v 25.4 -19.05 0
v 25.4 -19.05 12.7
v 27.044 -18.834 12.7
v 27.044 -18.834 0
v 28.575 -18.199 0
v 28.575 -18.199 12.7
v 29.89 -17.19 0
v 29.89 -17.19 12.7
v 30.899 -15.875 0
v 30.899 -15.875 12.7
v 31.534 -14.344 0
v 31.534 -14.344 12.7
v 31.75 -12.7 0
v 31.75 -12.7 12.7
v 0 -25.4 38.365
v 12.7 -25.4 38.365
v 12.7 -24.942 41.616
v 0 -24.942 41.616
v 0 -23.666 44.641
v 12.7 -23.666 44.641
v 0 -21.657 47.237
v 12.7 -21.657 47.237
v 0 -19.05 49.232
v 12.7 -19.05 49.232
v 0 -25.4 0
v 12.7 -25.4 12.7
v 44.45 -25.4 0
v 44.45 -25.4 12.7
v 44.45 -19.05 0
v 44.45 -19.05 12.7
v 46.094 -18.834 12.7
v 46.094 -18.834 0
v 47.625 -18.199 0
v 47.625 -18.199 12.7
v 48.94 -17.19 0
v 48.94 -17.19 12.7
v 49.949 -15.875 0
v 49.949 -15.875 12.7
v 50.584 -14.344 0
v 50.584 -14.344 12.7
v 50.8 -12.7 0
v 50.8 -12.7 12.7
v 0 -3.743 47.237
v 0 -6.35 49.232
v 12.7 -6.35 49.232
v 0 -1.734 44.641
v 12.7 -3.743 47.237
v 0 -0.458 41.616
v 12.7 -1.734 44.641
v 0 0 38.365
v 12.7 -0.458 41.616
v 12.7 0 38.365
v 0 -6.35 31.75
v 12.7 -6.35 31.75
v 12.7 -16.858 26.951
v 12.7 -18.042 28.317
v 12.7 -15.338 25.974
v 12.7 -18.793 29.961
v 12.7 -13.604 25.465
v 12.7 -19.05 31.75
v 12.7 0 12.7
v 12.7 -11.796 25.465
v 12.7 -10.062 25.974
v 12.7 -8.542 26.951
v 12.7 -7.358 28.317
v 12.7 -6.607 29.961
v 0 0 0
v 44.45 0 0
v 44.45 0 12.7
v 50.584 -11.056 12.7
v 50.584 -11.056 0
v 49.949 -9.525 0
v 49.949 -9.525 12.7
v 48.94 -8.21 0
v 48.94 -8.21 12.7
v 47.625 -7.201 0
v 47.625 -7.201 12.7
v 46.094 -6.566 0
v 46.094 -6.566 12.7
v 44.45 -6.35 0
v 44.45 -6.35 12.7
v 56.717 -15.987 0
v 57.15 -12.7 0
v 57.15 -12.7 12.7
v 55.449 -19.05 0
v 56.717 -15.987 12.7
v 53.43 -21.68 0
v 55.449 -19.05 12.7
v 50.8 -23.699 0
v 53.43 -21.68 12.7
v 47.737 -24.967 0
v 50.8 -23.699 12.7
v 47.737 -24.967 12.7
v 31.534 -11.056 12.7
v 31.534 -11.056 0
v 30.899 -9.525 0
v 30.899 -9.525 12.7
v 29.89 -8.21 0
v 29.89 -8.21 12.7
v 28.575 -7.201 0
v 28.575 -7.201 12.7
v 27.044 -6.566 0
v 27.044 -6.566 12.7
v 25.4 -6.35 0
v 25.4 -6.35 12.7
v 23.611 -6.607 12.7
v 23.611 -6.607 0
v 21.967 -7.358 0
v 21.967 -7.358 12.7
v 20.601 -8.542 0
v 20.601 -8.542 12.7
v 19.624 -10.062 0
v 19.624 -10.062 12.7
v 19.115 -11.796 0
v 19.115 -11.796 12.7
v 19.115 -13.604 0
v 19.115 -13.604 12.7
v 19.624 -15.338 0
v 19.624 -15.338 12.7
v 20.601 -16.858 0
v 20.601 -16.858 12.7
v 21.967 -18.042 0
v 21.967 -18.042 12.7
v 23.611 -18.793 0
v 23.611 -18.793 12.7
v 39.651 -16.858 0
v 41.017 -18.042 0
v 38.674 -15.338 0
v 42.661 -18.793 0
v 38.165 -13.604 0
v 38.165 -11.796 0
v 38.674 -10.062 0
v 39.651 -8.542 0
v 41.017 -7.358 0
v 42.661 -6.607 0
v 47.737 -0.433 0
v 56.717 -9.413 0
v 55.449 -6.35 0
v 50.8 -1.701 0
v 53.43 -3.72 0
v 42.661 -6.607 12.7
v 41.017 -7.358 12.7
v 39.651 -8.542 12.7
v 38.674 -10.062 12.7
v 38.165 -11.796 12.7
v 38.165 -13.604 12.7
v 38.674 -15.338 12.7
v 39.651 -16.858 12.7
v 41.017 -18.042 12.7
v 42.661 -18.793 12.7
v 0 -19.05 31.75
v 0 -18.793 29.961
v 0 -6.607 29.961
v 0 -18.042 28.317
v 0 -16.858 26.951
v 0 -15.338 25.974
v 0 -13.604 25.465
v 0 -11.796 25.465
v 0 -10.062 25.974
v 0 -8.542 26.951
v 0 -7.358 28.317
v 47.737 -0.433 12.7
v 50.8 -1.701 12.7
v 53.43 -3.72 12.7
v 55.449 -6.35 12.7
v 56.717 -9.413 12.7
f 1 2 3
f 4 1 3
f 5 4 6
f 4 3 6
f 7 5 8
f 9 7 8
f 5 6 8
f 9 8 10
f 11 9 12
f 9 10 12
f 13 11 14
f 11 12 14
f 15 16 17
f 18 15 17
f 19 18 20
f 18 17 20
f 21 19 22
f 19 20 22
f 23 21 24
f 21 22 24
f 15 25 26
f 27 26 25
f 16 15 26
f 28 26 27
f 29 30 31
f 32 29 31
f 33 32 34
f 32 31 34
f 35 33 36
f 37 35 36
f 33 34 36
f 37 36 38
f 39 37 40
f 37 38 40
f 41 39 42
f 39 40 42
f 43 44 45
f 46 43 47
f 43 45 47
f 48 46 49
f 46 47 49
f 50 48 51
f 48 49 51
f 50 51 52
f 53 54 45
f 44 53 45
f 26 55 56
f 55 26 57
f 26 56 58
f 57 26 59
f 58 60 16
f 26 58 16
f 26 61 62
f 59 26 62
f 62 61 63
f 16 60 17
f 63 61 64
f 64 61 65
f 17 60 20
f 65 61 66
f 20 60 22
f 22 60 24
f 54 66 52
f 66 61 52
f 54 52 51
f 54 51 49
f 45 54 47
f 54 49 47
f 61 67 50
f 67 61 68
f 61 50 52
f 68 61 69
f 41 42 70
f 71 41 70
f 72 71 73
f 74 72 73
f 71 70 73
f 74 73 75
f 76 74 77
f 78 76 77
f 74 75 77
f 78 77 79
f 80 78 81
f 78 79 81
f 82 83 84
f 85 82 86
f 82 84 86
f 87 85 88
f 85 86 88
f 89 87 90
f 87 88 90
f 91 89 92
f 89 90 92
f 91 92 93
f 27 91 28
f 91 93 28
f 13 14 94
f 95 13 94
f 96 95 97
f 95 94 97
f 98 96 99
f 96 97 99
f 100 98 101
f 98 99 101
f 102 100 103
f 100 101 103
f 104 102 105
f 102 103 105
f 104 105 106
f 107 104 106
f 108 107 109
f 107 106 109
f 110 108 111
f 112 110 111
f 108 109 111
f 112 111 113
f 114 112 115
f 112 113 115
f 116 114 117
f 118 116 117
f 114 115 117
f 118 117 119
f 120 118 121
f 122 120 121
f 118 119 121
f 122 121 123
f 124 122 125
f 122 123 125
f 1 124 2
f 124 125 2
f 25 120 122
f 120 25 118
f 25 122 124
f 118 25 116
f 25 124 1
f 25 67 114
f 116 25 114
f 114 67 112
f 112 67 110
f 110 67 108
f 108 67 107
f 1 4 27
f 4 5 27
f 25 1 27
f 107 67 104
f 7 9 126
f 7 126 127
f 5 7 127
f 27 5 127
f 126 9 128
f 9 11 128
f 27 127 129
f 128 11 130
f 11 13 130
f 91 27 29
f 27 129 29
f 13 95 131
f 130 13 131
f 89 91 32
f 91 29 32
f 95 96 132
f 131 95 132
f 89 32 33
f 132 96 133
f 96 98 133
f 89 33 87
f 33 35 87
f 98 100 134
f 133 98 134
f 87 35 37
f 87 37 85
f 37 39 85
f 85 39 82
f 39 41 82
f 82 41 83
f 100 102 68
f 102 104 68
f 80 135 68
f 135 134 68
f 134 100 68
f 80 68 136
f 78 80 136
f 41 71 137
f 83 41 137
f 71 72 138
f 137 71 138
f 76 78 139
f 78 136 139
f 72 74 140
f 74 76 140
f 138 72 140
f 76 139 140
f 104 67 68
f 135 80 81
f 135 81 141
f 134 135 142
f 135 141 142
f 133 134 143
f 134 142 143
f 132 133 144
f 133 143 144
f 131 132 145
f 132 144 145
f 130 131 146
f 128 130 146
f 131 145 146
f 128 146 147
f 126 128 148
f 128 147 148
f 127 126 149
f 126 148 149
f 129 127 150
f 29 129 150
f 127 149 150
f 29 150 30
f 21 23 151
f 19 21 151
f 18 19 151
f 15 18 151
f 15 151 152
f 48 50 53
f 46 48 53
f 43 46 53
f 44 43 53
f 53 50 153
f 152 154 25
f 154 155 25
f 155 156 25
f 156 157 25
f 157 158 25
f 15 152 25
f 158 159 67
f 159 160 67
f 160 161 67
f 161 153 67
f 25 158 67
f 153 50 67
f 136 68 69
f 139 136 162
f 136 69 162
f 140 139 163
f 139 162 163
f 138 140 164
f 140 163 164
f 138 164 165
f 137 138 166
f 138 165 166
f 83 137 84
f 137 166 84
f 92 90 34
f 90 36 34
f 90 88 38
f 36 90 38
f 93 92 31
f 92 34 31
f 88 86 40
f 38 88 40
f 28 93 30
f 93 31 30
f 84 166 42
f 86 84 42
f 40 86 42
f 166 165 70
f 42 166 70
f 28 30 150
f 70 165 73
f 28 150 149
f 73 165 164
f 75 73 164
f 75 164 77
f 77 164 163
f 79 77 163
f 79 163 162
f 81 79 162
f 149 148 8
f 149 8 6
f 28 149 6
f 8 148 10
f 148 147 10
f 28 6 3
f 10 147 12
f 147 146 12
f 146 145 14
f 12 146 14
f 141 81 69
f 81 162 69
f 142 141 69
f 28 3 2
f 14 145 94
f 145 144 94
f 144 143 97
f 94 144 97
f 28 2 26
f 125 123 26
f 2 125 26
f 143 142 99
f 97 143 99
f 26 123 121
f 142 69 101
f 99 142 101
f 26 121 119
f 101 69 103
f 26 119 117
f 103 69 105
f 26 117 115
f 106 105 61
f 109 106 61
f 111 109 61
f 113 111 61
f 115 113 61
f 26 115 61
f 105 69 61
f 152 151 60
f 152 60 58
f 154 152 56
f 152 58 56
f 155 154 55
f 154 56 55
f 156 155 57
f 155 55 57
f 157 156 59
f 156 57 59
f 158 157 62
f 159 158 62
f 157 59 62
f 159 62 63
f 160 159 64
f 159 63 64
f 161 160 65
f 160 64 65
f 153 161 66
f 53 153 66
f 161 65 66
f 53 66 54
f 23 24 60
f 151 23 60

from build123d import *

# Parameters (mm, degrees)
F1_DEPTH = 25.4
F3_DEPTH = 12.701
F5_DEPTH = 12.701
F7_DEPTH = 12.701


with BuildPart() as f1:
    # F0 (on Front) → F1 (new body)
    with BuildSketch(Plane.XZ):
        Polygon((0, 50.8), (0, 0), (57.15, 0), (57.15, 12.7), (12.7, 12.7), (12.7, 50.8), align=None)
    extrude(amount=F1_DEPTH)

    # F2 (on face) → F3 (cut, through all)
    with BuildSketch(Plane.YZ.offset(12.7)):
        with BuildLine():
            ThreePointArc((-6.35, 31.75), (-12.7, 38.1), (-19.05, 31.75))
            Line((-19.05, 31.75), (-6.35, 31.75))
        make_face()
        with BuildLine():
            Line((-6.35, 31.75), (-19.05, 31.75))
            ThreePointArc((-19.05, 31.75), (-12.7, 25.4), (-6.35, 31.75))
        make_face()
        with BuildLine():
            Line((-19.05, 50.8), (-19.05, 31.75))
            ThreePointArc((-19.05, 31.75), (-12.7, 38.1), (-6.35, 31.75))
            Line((-6.35, 31.75), (-6.35, 50.8))
            Line((-6.35, 50.8), (-19.05, 50.8))
        make_face()
    extrude(amount=-F3_DEPTH, mode=Mode.SUBTRACT)

    # F4 (on face) → F5 (cut, through all)
    with BuildSketch(Plane.YZ.offset(12.7)):
        with BuildLine():
            Line((-25.4, 50.8), (-25.4, 38.3654093824))
            ThreePointArc((-25.4, 38.3654093824), (-23.6656953438, 44.6406010825), (-19.05, 49.2320278765))
            Line((-19.05, 49.2320278765), (-19.05, 50.8))
            Line((-19.05, 50.8), (-25.4, 50.8))
        make_face()
        with BuildLine():
            Line((-6.35, 50.8), (-6.35, 49.2320278765))
            ThreePointArc((-6.35, 49.2320278765), (-1.7343046562, 44.6406010825), (0, 38.3654093824))
            Line((0, 38.3654093824), (0, 50.8))
            Line((0, 50.8), (-6.35, 50.8))
        make_face()
    extrude(amount=-F5_DEPTH, mode=Mode.SUBTRACT)

    # F6 (on face) → F7 (cut, through all)
    with BuildSketch(Plane.XY.offset(12.7)):
        with BuildLine():
            ThreePointArc((25.4, -6.35), (19.05, -12.7), (25.4, -19.05))
            Line((25.4, -19.05), (25.4, -6.35))
        make_face()
        with BuildLine():
            Line((25.4, -6.35), (25.4, -19.05))
            ThreePointArc((25.4, -19.05), (29.8901280605, -17.1901280605), (31.75, -12.7))
            ThreePointArc((31.75, -12.7), (29.8901280605, -8.2098719395), (25.4, -6.35))
        make_face()
        with BuildLine():
            ThreePointArc((44.45, -6.35), (38.1, -12.7), (44.45, -19.05))
            Line((44.45, -19.05), (44.45, -6.35))
        make_face()
        with BuildLine():
            Line((44.45, -6.35), (44.45, -19.05))
            ThreePointArc((44.45, -19.05), (48.9401280605, -17.1901280605), (50.8, -12.7))
            ThreePointArc((50.8, -12.7), (48.9401280605, -8.2098719395), (44.45, -6.35))
        make_face()
        with BuildLine():
            ThreePointArc((57.15, -12.7), (53.4302561211, -21.6802561211), (44.45, -25.4))
            Line((44.45, -25.4), (57.15, -25.4))
            Line((57.15, -25.4), (57.15, -12.7))
        make_face()
        with BuildLine():
            ThreePointArc((44.45, 0), (53.4302561211, -3.7197438789), (57.15, -12.7))
            Line((57.15, -12.7), (57.15, 0))
            Line((57.15, 0), (44.45, 0))
        make_face()
    extrude(amount=-F7_DEPTH, mode=Mode.SUBTRACT)


solid = f1.part
